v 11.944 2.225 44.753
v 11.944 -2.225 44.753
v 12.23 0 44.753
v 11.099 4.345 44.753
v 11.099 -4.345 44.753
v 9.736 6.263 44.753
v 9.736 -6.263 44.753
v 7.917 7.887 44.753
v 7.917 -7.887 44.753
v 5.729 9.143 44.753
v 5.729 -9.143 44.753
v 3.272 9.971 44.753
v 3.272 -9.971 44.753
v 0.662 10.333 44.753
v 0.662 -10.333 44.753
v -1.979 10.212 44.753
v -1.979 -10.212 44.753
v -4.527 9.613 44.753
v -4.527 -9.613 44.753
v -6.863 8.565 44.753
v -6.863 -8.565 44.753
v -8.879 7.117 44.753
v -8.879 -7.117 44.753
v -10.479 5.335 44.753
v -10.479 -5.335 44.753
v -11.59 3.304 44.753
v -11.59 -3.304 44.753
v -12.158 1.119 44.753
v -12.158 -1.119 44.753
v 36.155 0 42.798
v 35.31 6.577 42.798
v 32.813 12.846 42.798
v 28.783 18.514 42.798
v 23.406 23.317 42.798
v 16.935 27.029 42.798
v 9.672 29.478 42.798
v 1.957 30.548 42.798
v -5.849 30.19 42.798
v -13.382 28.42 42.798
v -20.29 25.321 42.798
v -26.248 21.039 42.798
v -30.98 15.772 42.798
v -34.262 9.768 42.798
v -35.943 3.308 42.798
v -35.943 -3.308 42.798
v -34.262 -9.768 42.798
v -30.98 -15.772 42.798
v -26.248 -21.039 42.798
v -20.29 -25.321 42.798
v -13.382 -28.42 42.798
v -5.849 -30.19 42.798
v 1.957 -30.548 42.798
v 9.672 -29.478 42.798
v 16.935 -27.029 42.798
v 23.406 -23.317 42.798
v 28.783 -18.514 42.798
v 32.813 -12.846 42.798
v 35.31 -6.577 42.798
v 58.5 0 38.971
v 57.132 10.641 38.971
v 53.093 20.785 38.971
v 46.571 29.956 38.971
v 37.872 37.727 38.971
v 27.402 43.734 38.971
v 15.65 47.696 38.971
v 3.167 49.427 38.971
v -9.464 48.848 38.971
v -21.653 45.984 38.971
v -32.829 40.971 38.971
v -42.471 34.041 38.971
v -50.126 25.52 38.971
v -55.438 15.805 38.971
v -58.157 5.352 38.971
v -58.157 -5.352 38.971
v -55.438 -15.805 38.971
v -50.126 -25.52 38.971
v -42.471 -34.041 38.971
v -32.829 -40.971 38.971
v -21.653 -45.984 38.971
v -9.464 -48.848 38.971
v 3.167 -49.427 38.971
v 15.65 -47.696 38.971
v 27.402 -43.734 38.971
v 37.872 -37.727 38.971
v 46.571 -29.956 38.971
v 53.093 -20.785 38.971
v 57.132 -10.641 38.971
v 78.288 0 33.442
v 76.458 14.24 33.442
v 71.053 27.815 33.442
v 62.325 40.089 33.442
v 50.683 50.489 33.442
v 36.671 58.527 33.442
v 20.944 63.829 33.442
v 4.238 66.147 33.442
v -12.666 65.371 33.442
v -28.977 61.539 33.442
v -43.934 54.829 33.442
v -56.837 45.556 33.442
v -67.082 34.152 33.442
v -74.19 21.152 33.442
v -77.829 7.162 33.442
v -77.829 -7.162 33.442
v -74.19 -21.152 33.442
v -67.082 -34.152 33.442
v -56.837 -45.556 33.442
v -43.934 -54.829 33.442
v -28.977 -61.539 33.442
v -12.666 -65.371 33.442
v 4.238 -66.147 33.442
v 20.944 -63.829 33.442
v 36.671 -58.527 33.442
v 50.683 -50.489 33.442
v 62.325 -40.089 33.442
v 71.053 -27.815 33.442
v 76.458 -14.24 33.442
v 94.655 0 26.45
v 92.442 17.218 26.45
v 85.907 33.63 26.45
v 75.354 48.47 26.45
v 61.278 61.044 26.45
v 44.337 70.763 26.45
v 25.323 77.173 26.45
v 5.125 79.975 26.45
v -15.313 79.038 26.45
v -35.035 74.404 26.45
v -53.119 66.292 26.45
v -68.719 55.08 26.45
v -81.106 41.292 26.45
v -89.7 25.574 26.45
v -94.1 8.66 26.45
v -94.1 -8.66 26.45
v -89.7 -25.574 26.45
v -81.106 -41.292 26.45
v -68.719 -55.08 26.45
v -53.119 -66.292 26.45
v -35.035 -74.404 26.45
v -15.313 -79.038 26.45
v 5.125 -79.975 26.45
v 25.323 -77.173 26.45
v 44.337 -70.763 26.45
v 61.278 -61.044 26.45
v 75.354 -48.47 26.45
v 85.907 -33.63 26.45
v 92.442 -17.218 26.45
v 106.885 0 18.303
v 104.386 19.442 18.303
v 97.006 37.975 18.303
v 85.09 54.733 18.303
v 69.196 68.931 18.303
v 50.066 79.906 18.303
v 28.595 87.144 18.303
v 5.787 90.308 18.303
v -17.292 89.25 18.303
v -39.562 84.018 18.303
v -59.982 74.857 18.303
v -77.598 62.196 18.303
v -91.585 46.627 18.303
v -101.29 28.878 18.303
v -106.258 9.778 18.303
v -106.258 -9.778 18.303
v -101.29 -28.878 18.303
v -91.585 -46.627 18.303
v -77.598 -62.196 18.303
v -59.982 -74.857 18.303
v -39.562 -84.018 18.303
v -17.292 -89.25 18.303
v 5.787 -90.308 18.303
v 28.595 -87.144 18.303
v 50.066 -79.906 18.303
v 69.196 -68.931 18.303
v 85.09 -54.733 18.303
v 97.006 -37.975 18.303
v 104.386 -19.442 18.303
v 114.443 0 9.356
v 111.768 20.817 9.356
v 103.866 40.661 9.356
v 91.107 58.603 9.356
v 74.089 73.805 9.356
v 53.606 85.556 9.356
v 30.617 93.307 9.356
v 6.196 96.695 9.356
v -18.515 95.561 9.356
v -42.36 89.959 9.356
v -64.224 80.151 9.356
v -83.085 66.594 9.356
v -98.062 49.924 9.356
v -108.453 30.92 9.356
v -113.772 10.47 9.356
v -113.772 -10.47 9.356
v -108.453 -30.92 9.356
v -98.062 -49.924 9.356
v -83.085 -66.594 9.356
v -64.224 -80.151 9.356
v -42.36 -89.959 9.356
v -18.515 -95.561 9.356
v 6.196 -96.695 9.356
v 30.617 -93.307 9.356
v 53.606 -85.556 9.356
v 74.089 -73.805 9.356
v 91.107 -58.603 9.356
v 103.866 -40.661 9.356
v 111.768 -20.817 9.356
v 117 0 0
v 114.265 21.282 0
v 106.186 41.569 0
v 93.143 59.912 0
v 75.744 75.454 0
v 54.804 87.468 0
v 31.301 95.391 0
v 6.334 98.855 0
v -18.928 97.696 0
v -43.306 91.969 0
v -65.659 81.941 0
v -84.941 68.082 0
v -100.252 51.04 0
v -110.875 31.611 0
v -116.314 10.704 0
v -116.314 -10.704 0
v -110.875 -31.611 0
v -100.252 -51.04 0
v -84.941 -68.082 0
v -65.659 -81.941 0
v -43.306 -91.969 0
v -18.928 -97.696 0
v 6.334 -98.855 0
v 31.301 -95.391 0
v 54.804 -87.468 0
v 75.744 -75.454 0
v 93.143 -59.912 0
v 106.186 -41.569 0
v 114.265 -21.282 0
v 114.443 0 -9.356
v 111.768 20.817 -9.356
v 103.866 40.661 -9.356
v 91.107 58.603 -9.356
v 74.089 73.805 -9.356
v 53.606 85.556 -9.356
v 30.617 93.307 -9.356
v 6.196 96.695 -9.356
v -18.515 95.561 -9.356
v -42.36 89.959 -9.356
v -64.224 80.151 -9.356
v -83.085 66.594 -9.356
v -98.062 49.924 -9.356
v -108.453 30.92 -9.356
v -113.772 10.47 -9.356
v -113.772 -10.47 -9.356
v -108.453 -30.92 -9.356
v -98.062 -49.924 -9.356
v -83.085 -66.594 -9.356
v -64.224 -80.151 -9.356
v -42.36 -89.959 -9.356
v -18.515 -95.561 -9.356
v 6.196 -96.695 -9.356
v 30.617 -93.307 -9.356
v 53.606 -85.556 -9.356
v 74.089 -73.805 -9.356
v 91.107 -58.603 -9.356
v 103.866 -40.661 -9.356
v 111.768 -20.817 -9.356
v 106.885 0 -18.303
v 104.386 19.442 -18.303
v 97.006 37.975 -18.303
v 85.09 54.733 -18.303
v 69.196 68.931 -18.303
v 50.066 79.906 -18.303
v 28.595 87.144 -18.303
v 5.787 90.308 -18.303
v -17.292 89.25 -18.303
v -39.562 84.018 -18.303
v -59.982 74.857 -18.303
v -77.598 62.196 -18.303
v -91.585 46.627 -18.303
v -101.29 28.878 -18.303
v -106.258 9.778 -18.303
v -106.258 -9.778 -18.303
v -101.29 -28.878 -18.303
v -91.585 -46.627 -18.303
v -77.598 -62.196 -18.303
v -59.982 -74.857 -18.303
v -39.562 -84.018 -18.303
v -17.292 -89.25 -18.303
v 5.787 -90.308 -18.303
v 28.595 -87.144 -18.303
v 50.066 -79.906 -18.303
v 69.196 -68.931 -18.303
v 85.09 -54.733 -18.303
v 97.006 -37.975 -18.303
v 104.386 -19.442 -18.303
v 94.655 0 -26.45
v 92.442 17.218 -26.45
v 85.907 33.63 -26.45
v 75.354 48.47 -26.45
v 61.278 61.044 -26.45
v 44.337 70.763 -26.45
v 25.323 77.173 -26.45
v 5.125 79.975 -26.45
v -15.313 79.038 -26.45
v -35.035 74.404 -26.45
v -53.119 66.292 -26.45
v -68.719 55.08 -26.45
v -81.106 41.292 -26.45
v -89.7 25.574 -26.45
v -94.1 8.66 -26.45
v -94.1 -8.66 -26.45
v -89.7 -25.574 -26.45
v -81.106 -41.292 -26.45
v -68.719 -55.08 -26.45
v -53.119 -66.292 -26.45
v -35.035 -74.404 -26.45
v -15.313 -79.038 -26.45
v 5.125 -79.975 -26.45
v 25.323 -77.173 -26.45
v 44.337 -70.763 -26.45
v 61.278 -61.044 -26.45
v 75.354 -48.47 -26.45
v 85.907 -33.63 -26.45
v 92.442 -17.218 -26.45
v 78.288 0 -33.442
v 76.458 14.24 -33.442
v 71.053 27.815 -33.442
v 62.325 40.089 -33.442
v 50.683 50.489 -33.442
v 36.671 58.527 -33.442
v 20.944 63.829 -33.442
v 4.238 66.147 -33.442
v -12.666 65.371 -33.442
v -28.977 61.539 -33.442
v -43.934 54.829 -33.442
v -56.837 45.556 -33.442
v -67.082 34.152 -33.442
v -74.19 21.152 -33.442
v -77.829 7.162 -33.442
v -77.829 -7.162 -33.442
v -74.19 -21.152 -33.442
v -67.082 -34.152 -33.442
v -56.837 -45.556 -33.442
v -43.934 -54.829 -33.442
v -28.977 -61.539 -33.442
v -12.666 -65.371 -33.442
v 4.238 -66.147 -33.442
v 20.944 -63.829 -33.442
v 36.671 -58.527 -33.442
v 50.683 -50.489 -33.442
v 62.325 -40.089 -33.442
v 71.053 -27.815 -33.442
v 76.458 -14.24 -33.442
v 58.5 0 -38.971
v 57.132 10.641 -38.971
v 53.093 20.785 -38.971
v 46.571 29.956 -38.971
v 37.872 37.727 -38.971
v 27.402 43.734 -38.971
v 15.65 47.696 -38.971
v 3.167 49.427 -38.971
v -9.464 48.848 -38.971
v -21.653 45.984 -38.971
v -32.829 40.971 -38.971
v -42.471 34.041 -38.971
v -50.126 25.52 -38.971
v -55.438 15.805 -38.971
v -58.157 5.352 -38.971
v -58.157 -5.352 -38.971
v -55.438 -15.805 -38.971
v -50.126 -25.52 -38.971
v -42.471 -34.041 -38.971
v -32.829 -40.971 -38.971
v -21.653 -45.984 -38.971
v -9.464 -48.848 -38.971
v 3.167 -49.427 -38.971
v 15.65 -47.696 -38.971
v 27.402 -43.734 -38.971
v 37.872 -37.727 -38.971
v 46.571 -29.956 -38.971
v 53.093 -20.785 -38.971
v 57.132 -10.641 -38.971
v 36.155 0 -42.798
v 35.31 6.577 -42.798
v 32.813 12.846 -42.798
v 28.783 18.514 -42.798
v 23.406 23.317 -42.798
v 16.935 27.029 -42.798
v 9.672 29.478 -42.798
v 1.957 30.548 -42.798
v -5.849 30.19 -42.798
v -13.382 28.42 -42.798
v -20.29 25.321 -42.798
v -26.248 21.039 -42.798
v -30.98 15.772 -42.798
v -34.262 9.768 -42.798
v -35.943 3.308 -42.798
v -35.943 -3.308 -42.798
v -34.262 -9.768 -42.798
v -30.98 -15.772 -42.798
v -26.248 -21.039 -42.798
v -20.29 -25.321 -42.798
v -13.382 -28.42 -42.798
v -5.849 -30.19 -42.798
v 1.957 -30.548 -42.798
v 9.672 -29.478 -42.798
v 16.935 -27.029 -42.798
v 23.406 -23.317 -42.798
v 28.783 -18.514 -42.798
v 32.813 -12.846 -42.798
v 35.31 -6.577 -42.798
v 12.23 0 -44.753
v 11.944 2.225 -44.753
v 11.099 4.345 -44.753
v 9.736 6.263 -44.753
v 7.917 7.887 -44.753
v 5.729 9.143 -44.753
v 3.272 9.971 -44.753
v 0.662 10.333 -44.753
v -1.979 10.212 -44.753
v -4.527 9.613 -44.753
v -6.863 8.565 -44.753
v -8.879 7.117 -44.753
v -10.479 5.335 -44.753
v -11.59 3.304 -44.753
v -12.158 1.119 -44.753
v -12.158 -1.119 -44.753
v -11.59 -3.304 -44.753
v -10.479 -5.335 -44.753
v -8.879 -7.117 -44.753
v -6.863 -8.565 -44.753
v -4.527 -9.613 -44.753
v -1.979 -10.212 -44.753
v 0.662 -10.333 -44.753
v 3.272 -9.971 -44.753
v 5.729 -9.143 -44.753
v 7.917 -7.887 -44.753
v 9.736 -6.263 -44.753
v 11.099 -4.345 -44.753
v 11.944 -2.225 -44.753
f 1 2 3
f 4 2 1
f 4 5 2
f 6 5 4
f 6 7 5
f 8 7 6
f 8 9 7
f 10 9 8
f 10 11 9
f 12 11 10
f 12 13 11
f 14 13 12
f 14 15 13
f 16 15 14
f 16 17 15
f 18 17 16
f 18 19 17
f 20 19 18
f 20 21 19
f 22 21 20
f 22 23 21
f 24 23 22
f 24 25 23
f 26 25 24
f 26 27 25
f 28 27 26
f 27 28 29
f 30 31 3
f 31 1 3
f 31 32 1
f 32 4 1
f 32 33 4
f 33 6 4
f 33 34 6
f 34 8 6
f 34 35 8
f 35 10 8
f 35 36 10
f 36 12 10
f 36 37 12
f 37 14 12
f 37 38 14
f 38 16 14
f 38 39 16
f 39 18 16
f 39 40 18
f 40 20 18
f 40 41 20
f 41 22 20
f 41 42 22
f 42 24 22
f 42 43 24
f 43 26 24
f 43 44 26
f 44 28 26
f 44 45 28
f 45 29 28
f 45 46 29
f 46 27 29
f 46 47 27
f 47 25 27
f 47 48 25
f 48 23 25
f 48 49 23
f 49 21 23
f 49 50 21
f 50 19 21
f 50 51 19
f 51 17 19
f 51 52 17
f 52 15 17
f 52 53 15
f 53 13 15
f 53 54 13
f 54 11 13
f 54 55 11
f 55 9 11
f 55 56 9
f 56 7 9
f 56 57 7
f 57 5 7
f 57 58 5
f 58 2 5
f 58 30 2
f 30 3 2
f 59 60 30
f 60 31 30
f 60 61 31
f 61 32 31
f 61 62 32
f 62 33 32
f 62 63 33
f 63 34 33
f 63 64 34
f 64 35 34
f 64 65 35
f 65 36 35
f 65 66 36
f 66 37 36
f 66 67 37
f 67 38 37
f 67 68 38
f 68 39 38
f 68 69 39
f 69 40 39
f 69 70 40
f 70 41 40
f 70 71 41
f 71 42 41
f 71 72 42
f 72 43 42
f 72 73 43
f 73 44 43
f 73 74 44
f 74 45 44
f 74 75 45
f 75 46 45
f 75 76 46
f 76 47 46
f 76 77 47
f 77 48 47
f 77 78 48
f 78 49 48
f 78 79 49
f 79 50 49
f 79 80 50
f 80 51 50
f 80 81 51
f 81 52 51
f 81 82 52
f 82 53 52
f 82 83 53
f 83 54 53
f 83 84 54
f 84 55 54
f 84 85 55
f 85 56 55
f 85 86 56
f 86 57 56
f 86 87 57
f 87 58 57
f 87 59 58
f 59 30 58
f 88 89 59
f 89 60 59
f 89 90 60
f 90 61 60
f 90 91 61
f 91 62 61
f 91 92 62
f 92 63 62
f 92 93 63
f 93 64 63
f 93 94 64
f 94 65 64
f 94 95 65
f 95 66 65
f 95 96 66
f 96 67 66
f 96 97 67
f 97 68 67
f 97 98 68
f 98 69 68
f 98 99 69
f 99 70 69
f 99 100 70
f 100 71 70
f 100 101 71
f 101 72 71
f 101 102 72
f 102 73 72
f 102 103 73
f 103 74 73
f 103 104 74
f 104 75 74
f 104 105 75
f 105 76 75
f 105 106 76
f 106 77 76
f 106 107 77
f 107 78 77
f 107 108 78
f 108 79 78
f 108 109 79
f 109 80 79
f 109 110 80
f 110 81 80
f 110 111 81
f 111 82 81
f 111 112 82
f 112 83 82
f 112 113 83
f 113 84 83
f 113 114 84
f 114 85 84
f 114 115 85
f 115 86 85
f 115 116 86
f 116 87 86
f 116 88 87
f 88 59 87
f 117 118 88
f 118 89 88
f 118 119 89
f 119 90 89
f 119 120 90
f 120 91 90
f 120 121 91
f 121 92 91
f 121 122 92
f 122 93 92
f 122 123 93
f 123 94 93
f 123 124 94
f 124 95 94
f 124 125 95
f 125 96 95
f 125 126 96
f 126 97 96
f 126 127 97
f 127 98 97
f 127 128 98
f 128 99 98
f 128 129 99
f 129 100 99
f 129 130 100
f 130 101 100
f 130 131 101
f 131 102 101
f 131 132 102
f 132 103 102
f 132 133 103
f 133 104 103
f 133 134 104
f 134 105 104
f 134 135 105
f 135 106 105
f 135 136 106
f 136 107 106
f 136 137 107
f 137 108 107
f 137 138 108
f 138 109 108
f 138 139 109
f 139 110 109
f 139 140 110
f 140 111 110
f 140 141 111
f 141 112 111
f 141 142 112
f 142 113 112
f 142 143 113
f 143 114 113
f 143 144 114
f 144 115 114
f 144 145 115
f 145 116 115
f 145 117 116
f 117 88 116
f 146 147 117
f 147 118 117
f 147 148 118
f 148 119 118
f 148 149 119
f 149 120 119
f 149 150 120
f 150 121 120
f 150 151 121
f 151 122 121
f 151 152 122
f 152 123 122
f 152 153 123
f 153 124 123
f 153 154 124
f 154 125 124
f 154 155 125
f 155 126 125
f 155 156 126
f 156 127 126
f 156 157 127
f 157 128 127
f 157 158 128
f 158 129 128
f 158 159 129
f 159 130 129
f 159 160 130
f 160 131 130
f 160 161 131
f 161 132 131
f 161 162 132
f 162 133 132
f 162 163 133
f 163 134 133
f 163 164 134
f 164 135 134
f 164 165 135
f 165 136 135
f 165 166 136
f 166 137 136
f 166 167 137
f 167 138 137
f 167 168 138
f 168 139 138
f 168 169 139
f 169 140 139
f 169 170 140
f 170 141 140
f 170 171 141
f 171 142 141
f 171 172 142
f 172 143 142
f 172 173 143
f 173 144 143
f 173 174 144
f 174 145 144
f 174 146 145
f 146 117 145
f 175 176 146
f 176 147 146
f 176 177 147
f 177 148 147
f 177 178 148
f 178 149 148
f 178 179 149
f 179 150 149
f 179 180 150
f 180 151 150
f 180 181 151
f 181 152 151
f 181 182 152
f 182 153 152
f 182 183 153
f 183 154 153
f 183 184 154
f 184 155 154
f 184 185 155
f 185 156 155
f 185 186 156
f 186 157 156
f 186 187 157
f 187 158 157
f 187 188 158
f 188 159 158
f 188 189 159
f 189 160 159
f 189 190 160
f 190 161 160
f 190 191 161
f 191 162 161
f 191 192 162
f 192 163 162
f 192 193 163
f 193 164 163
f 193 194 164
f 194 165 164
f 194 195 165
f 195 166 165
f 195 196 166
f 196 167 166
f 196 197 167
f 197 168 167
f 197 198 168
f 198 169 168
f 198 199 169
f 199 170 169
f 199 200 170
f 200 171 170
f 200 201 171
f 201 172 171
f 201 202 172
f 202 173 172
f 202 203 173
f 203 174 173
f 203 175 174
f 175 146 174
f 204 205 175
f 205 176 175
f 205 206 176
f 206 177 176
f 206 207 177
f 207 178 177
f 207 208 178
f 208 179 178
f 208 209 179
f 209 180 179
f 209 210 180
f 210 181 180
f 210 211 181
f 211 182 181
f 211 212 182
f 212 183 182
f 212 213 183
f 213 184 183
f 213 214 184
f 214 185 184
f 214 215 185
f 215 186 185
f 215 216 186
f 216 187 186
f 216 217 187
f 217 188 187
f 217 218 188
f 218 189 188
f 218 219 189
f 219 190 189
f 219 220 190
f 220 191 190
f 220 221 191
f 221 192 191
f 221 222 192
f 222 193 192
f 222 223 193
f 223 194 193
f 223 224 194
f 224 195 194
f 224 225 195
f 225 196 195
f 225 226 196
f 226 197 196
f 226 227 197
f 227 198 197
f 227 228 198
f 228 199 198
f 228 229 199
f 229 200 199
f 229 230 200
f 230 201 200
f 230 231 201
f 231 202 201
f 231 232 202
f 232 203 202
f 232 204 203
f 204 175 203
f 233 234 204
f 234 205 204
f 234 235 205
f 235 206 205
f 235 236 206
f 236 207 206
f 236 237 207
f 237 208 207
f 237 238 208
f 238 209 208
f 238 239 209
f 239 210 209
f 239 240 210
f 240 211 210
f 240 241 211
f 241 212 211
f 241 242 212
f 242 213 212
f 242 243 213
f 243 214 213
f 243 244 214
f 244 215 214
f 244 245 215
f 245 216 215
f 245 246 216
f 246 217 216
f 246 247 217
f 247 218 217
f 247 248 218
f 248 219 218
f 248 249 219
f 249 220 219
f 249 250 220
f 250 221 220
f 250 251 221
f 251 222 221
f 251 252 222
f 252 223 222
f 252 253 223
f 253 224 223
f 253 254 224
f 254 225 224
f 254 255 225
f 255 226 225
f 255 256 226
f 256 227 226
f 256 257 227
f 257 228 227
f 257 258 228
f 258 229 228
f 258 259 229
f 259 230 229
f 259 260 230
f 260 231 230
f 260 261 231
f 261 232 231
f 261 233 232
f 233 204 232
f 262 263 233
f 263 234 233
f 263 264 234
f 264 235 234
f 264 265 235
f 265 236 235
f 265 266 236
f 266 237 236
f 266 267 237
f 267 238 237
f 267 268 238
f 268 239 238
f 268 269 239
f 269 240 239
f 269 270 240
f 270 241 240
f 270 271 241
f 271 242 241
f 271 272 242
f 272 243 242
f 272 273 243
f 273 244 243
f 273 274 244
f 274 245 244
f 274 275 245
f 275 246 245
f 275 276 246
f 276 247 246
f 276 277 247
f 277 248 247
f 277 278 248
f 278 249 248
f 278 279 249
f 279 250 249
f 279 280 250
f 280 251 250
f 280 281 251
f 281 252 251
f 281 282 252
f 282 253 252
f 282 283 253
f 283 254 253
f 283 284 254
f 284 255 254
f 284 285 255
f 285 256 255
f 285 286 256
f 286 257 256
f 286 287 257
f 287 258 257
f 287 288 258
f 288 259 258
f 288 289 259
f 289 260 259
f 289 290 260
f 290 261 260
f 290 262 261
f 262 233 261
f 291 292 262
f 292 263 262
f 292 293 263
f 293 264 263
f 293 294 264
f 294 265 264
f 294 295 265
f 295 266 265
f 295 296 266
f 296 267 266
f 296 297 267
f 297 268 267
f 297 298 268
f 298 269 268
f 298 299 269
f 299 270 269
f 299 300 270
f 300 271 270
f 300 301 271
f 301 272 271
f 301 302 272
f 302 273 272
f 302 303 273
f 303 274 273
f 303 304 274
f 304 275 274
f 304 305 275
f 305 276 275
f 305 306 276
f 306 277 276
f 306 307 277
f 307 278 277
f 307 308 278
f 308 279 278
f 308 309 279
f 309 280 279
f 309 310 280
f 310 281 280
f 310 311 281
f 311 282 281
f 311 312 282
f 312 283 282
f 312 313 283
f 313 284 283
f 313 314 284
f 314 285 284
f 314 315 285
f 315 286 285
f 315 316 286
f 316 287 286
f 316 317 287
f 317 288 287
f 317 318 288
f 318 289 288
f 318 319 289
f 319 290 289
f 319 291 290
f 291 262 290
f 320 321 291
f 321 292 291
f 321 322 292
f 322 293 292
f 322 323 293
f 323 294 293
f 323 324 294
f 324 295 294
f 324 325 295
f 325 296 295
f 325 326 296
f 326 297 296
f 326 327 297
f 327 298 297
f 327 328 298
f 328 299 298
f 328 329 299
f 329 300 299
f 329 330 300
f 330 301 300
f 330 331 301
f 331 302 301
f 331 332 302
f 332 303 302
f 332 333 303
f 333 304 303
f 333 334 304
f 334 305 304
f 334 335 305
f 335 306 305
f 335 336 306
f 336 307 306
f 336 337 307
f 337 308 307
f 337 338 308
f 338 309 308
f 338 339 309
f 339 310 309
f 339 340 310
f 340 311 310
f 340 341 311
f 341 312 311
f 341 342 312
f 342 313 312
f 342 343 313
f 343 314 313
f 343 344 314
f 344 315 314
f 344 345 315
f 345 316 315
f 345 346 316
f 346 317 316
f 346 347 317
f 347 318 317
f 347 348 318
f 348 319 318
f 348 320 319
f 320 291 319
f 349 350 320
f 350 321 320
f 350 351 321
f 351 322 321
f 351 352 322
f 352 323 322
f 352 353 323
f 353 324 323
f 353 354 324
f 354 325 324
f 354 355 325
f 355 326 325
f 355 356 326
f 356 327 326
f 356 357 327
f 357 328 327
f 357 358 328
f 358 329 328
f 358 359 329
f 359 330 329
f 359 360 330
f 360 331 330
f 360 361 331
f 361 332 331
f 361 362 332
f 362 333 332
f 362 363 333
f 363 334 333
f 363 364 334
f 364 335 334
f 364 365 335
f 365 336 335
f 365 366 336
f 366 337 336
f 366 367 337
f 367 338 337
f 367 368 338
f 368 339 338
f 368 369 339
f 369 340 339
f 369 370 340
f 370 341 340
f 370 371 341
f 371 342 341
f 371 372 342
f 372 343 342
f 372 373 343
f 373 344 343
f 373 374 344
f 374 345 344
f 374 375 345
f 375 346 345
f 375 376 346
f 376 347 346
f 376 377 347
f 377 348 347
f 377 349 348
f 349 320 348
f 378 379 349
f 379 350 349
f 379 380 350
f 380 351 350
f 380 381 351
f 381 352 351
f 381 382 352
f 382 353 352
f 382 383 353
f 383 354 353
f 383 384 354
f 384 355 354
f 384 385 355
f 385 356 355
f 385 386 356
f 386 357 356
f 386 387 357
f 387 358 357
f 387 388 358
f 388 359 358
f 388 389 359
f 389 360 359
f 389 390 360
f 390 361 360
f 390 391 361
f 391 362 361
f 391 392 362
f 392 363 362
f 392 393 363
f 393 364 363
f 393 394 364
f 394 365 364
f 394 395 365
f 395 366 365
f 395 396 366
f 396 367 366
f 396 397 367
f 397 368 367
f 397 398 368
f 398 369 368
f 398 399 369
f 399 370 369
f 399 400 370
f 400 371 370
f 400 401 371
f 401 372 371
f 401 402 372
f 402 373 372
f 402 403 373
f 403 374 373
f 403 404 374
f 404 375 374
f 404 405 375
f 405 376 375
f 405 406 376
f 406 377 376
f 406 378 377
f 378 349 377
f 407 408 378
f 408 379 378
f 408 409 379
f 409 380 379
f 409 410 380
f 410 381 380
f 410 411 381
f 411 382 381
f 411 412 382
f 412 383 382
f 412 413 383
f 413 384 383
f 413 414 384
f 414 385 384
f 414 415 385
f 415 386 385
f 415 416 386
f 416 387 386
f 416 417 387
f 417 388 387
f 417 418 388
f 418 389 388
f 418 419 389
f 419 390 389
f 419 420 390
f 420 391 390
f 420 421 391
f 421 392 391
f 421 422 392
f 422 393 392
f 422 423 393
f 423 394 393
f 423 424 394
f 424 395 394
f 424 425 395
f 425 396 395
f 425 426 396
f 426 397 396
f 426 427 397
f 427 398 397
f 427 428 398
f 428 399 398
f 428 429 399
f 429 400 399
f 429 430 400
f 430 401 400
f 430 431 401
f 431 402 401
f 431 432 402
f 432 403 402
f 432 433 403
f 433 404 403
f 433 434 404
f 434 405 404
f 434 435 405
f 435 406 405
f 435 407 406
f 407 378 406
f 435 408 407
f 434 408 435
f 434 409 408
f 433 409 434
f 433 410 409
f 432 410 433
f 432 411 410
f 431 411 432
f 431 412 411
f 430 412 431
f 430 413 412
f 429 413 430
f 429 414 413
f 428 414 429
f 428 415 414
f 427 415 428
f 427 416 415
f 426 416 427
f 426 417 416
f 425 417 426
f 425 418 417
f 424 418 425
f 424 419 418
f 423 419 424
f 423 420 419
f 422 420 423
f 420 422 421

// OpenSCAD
// Generated by SolidPython 1.0.1 on 2020-07-29 00:46:50


scale(v = [13, 11, 5]) {
	sphere(r = 9);
}
/***********************************************
*********      SolidPython code:      **********
************************************************
 
# import packages: SolidPython
from solid import *
from solid.utils import *
from itertools import chain, combinations, permutations


class Resize:

    def __init__(self, scad_file):
        self.scad_file = scad_file
        #self.scad_file = import_scad(scad_file)
        # cone/cylinder param:
        self.r1 = 0
        self.r2 = 0
        self.h = 0
        # rectangular prism param:
        self.w = 0
        self.l = 0
        # ellipse param:
        self.r = 0

    # import OpenScad code (file name corresponds to shape)


    # classify shape + parameters
    def assign(self, param1, param2, param3):
        if self.scad_file == 'cone.scad':
            self.r1 = param1
            self.r2 = param2
            self.h = param3
        elif self.scad_file == 'cylinder.scad':
            self.r1 = param1
            self.r2 = param2
            self.h = param3
        elif self.scad_file == 'rectangularPrism.scad':
            self.h = param1
            self.l = param2
            self.w = param3
        else:
            self.r = param1
            self.h = param2

    # resize parameters
    def iterate(self):
        x = range(3, 20, 2)
        i = 1
        if self.scad_file == 'cone.scad':
            tempList = list(permutations(x, 2))
            for temp in tempList:
                param1 = temp[0]
                param2 = temp[1]
                filepath = 'produced_scad_files/' + 'cone' + str(param1) + '_' + str(param2) + '_' + '.scad'
                scad_render_to_file(cylinder(h=param1, r1=param2, r2=0), filepath)

        elif self.scad_file == 'cylinder.scad':
            tempList = list(permutations(x, 3))
            for temp in tempList:
                param1 = temp[0]
                param2 = temp[1]
                filepath = 'produced_scad_files/' + 'cylinder' + str(param1) + '_' + str(param2) + '_' + '.scad'
                scad_render_to_file(cylinder(h=param1, r1=param2, r2=param2), filepath)

        elif self.scad_file == 'rectangularPrism.scad':
            tempList = list(permutations(x, 3))
            for temp in tempList:
                param1 = temp[0]
                param2 = temp[1]
                param3 = temp[2]
                filepath = 'produced_scad_files/' + 'rectangularPrism' + str(param1) + '_' + str(param2) + '_' + str(
                    param3) + '.scad'
                scad_render_to_file(cube(size=(param1, param2, param3)), filepath)

        elif self.scad_file == 'ellipse.scad':
            tempList = list(permutations(x, 4))
            for temp in tempList:
                param1 = temp[0]
                param2 = temp[1]
                param3 = temp[2]
                param4 = temp[3]
                filepath = 'produced_scad_files/' + 'ellipse' + str(param1) + '_' + str(param2) + '_' + str(param3) + '_' + str(param4) + '.scad'
                scad_render_to_file(scale([param1, param2, param3])(sphere(r=param4)), filepath)

    def render_to_scadfile(self):
        scad_render_to_file(scad, 'example.scad') 
 
************************************************/
